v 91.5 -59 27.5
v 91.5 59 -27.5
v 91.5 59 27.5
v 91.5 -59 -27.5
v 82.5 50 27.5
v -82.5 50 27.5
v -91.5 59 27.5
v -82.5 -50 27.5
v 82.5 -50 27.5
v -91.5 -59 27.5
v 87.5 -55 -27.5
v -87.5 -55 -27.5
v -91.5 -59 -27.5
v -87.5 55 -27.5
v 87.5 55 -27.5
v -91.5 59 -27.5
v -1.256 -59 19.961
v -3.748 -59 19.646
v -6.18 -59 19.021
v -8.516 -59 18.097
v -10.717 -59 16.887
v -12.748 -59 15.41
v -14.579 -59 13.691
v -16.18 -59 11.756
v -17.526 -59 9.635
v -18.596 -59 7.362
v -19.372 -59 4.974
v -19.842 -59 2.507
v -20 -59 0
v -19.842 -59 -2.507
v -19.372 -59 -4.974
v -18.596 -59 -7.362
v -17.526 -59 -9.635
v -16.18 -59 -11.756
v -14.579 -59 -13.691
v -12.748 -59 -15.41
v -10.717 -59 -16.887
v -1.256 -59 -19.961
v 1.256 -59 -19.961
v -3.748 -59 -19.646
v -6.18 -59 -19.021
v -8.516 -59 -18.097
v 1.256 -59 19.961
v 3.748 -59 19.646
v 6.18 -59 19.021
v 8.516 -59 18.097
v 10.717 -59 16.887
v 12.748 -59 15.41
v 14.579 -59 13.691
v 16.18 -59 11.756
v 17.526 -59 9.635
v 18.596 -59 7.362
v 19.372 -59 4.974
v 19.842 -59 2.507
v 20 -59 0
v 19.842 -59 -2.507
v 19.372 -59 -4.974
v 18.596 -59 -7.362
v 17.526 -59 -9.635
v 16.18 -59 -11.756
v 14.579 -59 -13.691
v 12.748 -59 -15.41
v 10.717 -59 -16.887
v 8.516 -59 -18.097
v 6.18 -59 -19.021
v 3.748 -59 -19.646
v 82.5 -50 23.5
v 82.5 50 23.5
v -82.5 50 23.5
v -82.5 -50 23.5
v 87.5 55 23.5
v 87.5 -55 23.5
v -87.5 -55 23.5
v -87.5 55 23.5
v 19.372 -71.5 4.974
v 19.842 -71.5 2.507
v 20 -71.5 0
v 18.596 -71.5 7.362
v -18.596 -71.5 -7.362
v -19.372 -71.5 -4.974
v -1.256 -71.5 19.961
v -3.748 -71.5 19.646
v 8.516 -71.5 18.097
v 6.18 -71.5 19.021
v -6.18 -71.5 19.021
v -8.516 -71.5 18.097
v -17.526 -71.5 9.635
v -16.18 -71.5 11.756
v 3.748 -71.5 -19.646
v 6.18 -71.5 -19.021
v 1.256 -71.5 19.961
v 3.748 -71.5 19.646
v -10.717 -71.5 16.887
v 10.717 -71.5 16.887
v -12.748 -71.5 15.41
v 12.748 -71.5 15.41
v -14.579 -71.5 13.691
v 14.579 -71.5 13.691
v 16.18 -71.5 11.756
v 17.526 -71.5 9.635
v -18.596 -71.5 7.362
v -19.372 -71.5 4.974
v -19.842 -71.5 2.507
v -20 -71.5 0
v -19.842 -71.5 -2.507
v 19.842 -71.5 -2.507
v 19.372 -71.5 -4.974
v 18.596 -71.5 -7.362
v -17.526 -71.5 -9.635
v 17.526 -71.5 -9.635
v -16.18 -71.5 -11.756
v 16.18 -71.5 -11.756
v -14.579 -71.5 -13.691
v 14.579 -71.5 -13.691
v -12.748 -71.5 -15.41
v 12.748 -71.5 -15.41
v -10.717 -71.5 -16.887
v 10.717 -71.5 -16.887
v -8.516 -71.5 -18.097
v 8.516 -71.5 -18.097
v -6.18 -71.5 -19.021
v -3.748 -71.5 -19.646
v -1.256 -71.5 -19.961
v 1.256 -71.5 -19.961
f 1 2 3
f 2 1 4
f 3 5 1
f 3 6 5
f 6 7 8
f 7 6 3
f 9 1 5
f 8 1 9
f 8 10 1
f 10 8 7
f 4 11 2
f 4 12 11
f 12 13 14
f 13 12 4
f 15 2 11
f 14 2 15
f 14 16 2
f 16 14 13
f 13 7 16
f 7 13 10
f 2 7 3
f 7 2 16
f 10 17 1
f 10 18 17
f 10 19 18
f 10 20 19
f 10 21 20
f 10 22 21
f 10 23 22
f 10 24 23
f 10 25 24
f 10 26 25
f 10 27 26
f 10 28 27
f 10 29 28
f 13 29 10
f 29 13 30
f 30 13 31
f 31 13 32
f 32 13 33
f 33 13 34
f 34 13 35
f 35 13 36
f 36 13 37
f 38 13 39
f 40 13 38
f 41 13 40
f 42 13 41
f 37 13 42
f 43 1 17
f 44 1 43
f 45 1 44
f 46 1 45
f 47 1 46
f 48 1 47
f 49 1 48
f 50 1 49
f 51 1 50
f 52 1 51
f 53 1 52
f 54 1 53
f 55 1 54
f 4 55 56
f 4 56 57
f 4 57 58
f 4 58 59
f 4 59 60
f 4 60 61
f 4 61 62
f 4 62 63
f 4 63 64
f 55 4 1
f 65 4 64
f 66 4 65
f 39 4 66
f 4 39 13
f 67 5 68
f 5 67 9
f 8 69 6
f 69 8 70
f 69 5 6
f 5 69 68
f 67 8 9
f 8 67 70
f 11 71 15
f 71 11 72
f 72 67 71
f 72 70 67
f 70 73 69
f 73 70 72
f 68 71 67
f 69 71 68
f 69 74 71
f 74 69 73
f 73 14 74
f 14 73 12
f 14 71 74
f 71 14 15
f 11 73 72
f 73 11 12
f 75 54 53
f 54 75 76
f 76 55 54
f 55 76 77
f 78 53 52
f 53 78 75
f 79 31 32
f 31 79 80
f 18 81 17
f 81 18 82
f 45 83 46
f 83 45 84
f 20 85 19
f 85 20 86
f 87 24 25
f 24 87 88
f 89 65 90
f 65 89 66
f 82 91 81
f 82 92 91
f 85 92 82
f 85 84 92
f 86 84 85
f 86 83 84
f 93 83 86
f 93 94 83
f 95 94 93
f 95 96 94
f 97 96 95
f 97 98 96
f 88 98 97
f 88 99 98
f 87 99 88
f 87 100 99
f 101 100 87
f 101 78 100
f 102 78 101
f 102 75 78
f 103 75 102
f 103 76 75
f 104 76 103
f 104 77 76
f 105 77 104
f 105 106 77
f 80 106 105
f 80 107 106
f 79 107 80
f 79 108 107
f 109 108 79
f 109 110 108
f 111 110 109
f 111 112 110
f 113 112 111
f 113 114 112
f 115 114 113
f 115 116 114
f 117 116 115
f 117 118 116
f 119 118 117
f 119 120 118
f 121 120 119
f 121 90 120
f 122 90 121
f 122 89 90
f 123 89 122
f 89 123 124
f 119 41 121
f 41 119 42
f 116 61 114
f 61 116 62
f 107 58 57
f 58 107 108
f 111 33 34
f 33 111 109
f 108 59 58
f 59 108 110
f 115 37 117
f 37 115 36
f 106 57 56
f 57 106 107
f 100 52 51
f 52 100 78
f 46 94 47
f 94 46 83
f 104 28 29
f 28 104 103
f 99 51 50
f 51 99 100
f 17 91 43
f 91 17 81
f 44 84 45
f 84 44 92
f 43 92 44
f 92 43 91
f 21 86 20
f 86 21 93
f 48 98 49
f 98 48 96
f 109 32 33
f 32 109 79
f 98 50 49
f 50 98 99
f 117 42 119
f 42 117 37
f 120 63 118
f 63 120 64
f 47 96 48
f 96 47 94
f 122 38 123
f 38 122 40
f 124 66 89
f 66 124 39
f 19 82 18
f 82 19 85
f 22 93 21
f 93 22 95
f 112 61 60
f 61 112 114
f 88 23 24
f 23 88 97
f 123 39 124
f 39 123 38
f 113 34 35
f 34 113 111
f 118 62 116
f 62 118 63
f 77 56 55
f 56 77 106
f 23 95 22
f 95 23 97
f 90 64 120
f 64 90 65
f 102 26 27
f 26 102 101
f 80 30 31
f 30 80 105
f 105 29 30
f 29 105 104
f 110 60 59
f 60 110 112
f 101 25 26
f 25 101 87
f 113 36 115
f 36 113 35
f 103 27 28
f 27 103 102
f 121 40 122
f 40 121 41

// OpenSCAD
// R2-D2 Retro Monitor Head - OpenSCAD
// Dimensiuni estimate pentru ecran HDMI de 7 inch
screen_width = 165;   // Lățimea ecranului (mm)
screen_height = 100;  // Înălțimea ecranului (mm)
screen_depth = 12;    // Grosimea ecranului cu tot cu placă (mm)

// Setările carcasei
wall_thickness = 4;   // Grosimea peretelui printat (mm) - 4mm e foarte solid
case_width = screen_width + (wall_thickness * 2) + 10; // Adăugăm o margine retro (bezel)
case_height = screen_height + (wall_thickness * 2) + 10;
case_depth = 55;      // Suficient de adânc pentru a ascunde telefonul Huawei în spatele ecranului

module retro_monitor() {
    difference() {
        // 1. Carcasa exterioară solidă
        cube([case_width, case_height, case_depth], center=true);
        
        // 2. Decupajul frontal prin care vom vedea ecranul
        // Mutat spre fața carcasei
        translate([0, 0, (case_depth/2) - (screen_depth/2) + 1])
            cube([screen_width, screen_height, screen_depth + 2], center=true);
            
        // 3. Scobitura masivă interioară pentru telefonul Huawei, adaptor și cabluri
        translate([0, 0, -wall_thickness])
            cube([case_width - wall_thickness*2, case_height - wall_thickness*2, case_depth], center=true);
            
        // 4. Gaură în spate pentru ieșirea cablurilor (alimentare ecran + alimentare telefon)
        translate([0, 0, -case_depth/2])
            cube([30, 20, 10], center=true);
    }
    
    // Gulerul de jos (gâtul) care se va conecta de corpul robotului
    translate([0, -(case_height/2) - 5, 0])
        rotate([90, 0, 0])
        cylinder(h=15, r=20, center=true, $fn=50);
}

// Apelăm funcția de desenare
retro_monitor();
